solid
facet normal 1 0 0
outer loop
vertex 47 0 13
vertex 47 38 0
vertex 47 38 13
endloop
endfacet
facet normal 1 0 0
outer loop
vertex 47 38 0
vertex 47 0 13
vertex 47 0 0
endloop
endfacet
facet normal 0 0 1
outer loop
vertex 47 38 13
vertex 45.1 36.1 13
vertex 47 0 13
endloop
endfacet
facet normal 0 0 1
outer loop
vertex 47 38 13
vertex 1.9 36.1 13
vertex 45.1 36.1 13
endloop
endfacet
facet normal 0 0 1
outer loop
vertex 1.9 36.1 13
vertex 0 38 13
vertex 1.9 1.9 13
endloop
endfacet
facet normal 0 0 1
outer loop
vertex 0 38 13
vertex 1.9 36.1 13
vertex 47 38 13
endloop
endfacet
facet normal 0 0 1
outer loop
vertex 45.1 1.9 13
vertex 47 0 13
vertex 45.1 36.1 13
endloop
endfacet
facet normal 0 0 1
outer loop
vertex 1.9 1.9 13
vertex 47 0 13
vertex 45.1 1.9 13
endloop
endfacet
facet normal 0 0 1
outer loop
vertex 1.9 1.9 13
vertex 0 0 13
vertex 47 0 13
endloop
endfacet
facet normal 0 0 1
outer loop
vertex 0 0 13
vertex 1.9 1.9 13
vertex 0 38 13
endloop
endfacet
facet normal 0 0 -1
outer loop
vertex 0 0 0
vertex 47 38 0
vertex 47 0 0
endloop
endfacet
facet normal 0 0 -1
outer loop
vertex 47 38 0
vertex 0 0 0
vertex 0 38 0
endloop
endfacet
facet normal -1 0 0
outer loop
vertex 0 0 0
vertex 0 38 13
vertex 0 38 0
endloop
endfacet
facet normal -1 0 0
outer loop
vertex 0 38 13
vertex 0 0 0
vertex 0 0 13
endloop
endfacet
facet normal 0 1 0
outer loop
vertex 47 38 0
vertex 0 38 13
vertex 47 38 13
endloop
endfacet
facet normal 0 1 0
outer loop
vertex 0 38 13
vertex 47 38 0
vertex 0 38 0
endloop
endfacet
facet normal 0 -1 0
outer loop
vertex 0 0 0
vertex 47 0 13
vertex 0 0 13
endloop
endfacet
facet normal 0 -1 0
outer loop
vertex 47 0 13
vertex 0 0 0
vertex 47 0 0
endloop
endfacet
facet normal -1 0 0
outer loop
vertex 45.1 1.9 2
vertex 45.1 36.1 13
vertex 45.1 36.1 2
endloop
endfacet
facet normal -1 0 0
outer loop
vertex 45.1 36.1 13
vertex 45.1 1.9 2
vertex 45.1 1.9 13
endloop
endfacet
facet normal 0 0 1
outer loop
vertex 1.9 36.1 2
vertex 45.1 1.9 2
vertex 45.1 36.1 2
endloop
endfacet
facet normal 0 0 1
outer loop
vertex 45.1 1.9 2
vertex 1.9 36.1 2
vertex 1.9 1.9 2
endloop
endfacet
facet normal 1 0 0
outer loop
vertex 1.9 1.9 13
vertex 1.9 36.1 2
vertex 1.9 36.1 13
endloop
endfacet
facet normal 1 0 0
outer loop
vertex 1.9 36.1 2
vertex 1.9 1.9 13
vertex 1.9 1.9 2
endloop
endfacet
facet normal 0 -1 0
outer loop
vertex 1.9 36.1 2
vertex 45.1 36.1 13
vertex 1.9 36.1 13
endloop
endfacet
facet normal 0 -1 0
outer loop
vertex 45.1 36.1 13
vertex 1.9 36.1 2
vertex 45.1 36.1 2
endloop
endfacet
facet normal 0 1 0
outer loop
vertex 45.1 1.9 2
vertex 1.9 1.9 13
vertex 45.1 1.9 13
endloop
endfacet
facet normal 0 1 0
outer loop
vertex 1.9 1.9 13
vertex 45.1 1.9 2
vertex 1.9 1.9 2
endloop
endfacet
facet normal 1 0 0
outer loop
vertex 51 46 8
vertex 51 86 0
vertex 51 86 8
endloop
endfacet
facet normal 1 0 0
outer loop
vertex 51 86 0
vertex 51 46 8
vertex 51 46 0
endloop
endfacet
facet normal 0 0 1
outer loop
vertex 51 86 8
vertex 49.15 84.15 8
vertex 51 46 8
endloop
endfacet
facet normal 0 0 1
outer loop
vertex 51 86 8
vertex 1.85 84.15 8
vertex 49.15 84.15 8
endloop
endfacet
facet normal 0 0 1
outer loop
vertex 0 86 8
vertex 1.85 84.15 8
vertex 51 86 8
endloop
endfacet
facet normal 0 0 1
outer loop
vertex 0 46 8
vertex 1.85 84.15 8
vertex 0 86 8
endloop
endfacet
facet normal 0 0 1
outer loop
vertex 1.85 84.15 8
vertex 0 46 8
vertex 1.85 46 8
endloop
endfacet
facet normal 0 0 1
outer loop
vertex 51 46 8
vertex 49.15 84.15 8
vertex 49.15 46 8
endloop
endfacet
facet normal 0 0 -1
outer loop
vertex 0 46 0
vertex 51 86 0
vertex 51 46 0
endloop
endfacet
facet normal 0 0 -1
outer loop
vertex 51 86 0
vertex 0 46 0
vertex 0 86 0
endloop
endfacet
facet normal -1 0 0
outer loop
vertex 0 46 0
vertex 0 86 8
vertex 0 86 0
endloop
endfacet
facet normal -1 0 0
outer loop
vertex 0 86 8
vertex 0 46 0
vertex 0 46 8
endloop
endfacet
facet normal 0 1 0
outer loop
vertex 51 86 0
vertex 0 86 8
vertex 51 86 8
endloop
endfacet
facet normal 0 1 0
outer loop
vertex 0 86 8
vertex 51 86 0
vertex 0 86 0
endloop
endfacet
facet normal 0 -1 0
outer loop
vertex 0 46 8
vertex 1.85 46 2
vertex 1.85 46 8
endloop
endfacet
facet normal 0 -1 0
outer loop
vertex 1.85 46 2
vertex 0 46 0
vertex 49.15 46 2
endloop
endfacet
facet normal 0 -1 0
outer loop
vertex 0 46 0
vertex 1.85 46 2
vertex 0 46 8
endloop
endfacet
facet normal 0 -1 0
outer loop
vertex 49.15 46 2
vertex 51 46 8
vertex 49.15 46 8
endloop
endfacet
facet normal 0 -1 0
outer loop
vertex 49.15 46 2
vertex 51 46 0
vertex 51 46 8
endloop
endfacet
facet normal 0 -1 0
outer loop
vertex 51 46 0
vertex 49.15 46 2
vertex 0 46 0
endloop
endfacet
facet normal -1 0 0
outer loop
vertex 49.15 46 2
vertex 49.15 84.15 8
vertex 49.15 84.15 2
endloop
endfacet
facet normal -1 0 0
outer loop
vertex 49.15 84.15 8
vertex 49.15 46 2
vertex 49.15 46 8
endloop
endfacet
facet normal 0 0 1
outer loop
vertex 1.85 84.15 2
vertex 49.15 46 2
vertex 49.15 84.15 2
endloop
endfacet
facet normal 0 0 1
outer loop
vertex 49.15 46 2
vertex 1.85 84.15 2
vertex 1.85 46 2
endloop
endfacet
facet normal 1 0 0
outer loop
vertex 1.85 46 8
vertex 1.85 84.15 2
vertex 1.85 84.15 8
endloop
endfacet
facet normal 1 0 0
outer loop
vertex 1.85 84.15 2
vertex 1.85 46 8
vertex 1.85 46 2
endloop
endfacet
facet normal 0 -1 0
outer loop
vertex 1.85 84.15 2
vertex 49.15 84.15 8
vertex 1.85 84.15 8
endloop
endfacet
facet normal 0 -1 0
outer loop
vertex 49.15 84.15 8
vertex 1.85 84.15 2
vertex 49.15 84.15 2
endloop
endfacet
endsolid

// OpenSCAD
pcbWidth = 43;
pcbLength = 34;
pcbHeight = 11;

wireHeight = 6;
wallThickness = 2;

difference() {
    cube([pcbWidth + 2 * wallThickness, pcbLength + 2 * wallThickness, pcbHeight + wallThickness]);
    translate([wallThickness - 0.1, wallThickness - 0.1, wallThickness]) {
        cube([pcbWidth + 0.2, pcbLength + 0.2, pcbHeight + 0.01]);
    }
}

translate([0, pcbLength + 10, 0]) {
    difference() {
        translate([0, wallThickness, 0]) {
            cube([pcbWidth + 4 * wallThickness, pcbLength + 3 * wallThickness, wireHeight + wallThickness]);
        }
        translate([wallThickness - 0.15, wallThickness - 0.15, wallThickness]) {
            cube([pcbWidth + 2 * wallThickness + 0.3, pcbLength + 2 * wallThickness + 0.3, wireHeight + 0.01]); 
        }
    }
}
